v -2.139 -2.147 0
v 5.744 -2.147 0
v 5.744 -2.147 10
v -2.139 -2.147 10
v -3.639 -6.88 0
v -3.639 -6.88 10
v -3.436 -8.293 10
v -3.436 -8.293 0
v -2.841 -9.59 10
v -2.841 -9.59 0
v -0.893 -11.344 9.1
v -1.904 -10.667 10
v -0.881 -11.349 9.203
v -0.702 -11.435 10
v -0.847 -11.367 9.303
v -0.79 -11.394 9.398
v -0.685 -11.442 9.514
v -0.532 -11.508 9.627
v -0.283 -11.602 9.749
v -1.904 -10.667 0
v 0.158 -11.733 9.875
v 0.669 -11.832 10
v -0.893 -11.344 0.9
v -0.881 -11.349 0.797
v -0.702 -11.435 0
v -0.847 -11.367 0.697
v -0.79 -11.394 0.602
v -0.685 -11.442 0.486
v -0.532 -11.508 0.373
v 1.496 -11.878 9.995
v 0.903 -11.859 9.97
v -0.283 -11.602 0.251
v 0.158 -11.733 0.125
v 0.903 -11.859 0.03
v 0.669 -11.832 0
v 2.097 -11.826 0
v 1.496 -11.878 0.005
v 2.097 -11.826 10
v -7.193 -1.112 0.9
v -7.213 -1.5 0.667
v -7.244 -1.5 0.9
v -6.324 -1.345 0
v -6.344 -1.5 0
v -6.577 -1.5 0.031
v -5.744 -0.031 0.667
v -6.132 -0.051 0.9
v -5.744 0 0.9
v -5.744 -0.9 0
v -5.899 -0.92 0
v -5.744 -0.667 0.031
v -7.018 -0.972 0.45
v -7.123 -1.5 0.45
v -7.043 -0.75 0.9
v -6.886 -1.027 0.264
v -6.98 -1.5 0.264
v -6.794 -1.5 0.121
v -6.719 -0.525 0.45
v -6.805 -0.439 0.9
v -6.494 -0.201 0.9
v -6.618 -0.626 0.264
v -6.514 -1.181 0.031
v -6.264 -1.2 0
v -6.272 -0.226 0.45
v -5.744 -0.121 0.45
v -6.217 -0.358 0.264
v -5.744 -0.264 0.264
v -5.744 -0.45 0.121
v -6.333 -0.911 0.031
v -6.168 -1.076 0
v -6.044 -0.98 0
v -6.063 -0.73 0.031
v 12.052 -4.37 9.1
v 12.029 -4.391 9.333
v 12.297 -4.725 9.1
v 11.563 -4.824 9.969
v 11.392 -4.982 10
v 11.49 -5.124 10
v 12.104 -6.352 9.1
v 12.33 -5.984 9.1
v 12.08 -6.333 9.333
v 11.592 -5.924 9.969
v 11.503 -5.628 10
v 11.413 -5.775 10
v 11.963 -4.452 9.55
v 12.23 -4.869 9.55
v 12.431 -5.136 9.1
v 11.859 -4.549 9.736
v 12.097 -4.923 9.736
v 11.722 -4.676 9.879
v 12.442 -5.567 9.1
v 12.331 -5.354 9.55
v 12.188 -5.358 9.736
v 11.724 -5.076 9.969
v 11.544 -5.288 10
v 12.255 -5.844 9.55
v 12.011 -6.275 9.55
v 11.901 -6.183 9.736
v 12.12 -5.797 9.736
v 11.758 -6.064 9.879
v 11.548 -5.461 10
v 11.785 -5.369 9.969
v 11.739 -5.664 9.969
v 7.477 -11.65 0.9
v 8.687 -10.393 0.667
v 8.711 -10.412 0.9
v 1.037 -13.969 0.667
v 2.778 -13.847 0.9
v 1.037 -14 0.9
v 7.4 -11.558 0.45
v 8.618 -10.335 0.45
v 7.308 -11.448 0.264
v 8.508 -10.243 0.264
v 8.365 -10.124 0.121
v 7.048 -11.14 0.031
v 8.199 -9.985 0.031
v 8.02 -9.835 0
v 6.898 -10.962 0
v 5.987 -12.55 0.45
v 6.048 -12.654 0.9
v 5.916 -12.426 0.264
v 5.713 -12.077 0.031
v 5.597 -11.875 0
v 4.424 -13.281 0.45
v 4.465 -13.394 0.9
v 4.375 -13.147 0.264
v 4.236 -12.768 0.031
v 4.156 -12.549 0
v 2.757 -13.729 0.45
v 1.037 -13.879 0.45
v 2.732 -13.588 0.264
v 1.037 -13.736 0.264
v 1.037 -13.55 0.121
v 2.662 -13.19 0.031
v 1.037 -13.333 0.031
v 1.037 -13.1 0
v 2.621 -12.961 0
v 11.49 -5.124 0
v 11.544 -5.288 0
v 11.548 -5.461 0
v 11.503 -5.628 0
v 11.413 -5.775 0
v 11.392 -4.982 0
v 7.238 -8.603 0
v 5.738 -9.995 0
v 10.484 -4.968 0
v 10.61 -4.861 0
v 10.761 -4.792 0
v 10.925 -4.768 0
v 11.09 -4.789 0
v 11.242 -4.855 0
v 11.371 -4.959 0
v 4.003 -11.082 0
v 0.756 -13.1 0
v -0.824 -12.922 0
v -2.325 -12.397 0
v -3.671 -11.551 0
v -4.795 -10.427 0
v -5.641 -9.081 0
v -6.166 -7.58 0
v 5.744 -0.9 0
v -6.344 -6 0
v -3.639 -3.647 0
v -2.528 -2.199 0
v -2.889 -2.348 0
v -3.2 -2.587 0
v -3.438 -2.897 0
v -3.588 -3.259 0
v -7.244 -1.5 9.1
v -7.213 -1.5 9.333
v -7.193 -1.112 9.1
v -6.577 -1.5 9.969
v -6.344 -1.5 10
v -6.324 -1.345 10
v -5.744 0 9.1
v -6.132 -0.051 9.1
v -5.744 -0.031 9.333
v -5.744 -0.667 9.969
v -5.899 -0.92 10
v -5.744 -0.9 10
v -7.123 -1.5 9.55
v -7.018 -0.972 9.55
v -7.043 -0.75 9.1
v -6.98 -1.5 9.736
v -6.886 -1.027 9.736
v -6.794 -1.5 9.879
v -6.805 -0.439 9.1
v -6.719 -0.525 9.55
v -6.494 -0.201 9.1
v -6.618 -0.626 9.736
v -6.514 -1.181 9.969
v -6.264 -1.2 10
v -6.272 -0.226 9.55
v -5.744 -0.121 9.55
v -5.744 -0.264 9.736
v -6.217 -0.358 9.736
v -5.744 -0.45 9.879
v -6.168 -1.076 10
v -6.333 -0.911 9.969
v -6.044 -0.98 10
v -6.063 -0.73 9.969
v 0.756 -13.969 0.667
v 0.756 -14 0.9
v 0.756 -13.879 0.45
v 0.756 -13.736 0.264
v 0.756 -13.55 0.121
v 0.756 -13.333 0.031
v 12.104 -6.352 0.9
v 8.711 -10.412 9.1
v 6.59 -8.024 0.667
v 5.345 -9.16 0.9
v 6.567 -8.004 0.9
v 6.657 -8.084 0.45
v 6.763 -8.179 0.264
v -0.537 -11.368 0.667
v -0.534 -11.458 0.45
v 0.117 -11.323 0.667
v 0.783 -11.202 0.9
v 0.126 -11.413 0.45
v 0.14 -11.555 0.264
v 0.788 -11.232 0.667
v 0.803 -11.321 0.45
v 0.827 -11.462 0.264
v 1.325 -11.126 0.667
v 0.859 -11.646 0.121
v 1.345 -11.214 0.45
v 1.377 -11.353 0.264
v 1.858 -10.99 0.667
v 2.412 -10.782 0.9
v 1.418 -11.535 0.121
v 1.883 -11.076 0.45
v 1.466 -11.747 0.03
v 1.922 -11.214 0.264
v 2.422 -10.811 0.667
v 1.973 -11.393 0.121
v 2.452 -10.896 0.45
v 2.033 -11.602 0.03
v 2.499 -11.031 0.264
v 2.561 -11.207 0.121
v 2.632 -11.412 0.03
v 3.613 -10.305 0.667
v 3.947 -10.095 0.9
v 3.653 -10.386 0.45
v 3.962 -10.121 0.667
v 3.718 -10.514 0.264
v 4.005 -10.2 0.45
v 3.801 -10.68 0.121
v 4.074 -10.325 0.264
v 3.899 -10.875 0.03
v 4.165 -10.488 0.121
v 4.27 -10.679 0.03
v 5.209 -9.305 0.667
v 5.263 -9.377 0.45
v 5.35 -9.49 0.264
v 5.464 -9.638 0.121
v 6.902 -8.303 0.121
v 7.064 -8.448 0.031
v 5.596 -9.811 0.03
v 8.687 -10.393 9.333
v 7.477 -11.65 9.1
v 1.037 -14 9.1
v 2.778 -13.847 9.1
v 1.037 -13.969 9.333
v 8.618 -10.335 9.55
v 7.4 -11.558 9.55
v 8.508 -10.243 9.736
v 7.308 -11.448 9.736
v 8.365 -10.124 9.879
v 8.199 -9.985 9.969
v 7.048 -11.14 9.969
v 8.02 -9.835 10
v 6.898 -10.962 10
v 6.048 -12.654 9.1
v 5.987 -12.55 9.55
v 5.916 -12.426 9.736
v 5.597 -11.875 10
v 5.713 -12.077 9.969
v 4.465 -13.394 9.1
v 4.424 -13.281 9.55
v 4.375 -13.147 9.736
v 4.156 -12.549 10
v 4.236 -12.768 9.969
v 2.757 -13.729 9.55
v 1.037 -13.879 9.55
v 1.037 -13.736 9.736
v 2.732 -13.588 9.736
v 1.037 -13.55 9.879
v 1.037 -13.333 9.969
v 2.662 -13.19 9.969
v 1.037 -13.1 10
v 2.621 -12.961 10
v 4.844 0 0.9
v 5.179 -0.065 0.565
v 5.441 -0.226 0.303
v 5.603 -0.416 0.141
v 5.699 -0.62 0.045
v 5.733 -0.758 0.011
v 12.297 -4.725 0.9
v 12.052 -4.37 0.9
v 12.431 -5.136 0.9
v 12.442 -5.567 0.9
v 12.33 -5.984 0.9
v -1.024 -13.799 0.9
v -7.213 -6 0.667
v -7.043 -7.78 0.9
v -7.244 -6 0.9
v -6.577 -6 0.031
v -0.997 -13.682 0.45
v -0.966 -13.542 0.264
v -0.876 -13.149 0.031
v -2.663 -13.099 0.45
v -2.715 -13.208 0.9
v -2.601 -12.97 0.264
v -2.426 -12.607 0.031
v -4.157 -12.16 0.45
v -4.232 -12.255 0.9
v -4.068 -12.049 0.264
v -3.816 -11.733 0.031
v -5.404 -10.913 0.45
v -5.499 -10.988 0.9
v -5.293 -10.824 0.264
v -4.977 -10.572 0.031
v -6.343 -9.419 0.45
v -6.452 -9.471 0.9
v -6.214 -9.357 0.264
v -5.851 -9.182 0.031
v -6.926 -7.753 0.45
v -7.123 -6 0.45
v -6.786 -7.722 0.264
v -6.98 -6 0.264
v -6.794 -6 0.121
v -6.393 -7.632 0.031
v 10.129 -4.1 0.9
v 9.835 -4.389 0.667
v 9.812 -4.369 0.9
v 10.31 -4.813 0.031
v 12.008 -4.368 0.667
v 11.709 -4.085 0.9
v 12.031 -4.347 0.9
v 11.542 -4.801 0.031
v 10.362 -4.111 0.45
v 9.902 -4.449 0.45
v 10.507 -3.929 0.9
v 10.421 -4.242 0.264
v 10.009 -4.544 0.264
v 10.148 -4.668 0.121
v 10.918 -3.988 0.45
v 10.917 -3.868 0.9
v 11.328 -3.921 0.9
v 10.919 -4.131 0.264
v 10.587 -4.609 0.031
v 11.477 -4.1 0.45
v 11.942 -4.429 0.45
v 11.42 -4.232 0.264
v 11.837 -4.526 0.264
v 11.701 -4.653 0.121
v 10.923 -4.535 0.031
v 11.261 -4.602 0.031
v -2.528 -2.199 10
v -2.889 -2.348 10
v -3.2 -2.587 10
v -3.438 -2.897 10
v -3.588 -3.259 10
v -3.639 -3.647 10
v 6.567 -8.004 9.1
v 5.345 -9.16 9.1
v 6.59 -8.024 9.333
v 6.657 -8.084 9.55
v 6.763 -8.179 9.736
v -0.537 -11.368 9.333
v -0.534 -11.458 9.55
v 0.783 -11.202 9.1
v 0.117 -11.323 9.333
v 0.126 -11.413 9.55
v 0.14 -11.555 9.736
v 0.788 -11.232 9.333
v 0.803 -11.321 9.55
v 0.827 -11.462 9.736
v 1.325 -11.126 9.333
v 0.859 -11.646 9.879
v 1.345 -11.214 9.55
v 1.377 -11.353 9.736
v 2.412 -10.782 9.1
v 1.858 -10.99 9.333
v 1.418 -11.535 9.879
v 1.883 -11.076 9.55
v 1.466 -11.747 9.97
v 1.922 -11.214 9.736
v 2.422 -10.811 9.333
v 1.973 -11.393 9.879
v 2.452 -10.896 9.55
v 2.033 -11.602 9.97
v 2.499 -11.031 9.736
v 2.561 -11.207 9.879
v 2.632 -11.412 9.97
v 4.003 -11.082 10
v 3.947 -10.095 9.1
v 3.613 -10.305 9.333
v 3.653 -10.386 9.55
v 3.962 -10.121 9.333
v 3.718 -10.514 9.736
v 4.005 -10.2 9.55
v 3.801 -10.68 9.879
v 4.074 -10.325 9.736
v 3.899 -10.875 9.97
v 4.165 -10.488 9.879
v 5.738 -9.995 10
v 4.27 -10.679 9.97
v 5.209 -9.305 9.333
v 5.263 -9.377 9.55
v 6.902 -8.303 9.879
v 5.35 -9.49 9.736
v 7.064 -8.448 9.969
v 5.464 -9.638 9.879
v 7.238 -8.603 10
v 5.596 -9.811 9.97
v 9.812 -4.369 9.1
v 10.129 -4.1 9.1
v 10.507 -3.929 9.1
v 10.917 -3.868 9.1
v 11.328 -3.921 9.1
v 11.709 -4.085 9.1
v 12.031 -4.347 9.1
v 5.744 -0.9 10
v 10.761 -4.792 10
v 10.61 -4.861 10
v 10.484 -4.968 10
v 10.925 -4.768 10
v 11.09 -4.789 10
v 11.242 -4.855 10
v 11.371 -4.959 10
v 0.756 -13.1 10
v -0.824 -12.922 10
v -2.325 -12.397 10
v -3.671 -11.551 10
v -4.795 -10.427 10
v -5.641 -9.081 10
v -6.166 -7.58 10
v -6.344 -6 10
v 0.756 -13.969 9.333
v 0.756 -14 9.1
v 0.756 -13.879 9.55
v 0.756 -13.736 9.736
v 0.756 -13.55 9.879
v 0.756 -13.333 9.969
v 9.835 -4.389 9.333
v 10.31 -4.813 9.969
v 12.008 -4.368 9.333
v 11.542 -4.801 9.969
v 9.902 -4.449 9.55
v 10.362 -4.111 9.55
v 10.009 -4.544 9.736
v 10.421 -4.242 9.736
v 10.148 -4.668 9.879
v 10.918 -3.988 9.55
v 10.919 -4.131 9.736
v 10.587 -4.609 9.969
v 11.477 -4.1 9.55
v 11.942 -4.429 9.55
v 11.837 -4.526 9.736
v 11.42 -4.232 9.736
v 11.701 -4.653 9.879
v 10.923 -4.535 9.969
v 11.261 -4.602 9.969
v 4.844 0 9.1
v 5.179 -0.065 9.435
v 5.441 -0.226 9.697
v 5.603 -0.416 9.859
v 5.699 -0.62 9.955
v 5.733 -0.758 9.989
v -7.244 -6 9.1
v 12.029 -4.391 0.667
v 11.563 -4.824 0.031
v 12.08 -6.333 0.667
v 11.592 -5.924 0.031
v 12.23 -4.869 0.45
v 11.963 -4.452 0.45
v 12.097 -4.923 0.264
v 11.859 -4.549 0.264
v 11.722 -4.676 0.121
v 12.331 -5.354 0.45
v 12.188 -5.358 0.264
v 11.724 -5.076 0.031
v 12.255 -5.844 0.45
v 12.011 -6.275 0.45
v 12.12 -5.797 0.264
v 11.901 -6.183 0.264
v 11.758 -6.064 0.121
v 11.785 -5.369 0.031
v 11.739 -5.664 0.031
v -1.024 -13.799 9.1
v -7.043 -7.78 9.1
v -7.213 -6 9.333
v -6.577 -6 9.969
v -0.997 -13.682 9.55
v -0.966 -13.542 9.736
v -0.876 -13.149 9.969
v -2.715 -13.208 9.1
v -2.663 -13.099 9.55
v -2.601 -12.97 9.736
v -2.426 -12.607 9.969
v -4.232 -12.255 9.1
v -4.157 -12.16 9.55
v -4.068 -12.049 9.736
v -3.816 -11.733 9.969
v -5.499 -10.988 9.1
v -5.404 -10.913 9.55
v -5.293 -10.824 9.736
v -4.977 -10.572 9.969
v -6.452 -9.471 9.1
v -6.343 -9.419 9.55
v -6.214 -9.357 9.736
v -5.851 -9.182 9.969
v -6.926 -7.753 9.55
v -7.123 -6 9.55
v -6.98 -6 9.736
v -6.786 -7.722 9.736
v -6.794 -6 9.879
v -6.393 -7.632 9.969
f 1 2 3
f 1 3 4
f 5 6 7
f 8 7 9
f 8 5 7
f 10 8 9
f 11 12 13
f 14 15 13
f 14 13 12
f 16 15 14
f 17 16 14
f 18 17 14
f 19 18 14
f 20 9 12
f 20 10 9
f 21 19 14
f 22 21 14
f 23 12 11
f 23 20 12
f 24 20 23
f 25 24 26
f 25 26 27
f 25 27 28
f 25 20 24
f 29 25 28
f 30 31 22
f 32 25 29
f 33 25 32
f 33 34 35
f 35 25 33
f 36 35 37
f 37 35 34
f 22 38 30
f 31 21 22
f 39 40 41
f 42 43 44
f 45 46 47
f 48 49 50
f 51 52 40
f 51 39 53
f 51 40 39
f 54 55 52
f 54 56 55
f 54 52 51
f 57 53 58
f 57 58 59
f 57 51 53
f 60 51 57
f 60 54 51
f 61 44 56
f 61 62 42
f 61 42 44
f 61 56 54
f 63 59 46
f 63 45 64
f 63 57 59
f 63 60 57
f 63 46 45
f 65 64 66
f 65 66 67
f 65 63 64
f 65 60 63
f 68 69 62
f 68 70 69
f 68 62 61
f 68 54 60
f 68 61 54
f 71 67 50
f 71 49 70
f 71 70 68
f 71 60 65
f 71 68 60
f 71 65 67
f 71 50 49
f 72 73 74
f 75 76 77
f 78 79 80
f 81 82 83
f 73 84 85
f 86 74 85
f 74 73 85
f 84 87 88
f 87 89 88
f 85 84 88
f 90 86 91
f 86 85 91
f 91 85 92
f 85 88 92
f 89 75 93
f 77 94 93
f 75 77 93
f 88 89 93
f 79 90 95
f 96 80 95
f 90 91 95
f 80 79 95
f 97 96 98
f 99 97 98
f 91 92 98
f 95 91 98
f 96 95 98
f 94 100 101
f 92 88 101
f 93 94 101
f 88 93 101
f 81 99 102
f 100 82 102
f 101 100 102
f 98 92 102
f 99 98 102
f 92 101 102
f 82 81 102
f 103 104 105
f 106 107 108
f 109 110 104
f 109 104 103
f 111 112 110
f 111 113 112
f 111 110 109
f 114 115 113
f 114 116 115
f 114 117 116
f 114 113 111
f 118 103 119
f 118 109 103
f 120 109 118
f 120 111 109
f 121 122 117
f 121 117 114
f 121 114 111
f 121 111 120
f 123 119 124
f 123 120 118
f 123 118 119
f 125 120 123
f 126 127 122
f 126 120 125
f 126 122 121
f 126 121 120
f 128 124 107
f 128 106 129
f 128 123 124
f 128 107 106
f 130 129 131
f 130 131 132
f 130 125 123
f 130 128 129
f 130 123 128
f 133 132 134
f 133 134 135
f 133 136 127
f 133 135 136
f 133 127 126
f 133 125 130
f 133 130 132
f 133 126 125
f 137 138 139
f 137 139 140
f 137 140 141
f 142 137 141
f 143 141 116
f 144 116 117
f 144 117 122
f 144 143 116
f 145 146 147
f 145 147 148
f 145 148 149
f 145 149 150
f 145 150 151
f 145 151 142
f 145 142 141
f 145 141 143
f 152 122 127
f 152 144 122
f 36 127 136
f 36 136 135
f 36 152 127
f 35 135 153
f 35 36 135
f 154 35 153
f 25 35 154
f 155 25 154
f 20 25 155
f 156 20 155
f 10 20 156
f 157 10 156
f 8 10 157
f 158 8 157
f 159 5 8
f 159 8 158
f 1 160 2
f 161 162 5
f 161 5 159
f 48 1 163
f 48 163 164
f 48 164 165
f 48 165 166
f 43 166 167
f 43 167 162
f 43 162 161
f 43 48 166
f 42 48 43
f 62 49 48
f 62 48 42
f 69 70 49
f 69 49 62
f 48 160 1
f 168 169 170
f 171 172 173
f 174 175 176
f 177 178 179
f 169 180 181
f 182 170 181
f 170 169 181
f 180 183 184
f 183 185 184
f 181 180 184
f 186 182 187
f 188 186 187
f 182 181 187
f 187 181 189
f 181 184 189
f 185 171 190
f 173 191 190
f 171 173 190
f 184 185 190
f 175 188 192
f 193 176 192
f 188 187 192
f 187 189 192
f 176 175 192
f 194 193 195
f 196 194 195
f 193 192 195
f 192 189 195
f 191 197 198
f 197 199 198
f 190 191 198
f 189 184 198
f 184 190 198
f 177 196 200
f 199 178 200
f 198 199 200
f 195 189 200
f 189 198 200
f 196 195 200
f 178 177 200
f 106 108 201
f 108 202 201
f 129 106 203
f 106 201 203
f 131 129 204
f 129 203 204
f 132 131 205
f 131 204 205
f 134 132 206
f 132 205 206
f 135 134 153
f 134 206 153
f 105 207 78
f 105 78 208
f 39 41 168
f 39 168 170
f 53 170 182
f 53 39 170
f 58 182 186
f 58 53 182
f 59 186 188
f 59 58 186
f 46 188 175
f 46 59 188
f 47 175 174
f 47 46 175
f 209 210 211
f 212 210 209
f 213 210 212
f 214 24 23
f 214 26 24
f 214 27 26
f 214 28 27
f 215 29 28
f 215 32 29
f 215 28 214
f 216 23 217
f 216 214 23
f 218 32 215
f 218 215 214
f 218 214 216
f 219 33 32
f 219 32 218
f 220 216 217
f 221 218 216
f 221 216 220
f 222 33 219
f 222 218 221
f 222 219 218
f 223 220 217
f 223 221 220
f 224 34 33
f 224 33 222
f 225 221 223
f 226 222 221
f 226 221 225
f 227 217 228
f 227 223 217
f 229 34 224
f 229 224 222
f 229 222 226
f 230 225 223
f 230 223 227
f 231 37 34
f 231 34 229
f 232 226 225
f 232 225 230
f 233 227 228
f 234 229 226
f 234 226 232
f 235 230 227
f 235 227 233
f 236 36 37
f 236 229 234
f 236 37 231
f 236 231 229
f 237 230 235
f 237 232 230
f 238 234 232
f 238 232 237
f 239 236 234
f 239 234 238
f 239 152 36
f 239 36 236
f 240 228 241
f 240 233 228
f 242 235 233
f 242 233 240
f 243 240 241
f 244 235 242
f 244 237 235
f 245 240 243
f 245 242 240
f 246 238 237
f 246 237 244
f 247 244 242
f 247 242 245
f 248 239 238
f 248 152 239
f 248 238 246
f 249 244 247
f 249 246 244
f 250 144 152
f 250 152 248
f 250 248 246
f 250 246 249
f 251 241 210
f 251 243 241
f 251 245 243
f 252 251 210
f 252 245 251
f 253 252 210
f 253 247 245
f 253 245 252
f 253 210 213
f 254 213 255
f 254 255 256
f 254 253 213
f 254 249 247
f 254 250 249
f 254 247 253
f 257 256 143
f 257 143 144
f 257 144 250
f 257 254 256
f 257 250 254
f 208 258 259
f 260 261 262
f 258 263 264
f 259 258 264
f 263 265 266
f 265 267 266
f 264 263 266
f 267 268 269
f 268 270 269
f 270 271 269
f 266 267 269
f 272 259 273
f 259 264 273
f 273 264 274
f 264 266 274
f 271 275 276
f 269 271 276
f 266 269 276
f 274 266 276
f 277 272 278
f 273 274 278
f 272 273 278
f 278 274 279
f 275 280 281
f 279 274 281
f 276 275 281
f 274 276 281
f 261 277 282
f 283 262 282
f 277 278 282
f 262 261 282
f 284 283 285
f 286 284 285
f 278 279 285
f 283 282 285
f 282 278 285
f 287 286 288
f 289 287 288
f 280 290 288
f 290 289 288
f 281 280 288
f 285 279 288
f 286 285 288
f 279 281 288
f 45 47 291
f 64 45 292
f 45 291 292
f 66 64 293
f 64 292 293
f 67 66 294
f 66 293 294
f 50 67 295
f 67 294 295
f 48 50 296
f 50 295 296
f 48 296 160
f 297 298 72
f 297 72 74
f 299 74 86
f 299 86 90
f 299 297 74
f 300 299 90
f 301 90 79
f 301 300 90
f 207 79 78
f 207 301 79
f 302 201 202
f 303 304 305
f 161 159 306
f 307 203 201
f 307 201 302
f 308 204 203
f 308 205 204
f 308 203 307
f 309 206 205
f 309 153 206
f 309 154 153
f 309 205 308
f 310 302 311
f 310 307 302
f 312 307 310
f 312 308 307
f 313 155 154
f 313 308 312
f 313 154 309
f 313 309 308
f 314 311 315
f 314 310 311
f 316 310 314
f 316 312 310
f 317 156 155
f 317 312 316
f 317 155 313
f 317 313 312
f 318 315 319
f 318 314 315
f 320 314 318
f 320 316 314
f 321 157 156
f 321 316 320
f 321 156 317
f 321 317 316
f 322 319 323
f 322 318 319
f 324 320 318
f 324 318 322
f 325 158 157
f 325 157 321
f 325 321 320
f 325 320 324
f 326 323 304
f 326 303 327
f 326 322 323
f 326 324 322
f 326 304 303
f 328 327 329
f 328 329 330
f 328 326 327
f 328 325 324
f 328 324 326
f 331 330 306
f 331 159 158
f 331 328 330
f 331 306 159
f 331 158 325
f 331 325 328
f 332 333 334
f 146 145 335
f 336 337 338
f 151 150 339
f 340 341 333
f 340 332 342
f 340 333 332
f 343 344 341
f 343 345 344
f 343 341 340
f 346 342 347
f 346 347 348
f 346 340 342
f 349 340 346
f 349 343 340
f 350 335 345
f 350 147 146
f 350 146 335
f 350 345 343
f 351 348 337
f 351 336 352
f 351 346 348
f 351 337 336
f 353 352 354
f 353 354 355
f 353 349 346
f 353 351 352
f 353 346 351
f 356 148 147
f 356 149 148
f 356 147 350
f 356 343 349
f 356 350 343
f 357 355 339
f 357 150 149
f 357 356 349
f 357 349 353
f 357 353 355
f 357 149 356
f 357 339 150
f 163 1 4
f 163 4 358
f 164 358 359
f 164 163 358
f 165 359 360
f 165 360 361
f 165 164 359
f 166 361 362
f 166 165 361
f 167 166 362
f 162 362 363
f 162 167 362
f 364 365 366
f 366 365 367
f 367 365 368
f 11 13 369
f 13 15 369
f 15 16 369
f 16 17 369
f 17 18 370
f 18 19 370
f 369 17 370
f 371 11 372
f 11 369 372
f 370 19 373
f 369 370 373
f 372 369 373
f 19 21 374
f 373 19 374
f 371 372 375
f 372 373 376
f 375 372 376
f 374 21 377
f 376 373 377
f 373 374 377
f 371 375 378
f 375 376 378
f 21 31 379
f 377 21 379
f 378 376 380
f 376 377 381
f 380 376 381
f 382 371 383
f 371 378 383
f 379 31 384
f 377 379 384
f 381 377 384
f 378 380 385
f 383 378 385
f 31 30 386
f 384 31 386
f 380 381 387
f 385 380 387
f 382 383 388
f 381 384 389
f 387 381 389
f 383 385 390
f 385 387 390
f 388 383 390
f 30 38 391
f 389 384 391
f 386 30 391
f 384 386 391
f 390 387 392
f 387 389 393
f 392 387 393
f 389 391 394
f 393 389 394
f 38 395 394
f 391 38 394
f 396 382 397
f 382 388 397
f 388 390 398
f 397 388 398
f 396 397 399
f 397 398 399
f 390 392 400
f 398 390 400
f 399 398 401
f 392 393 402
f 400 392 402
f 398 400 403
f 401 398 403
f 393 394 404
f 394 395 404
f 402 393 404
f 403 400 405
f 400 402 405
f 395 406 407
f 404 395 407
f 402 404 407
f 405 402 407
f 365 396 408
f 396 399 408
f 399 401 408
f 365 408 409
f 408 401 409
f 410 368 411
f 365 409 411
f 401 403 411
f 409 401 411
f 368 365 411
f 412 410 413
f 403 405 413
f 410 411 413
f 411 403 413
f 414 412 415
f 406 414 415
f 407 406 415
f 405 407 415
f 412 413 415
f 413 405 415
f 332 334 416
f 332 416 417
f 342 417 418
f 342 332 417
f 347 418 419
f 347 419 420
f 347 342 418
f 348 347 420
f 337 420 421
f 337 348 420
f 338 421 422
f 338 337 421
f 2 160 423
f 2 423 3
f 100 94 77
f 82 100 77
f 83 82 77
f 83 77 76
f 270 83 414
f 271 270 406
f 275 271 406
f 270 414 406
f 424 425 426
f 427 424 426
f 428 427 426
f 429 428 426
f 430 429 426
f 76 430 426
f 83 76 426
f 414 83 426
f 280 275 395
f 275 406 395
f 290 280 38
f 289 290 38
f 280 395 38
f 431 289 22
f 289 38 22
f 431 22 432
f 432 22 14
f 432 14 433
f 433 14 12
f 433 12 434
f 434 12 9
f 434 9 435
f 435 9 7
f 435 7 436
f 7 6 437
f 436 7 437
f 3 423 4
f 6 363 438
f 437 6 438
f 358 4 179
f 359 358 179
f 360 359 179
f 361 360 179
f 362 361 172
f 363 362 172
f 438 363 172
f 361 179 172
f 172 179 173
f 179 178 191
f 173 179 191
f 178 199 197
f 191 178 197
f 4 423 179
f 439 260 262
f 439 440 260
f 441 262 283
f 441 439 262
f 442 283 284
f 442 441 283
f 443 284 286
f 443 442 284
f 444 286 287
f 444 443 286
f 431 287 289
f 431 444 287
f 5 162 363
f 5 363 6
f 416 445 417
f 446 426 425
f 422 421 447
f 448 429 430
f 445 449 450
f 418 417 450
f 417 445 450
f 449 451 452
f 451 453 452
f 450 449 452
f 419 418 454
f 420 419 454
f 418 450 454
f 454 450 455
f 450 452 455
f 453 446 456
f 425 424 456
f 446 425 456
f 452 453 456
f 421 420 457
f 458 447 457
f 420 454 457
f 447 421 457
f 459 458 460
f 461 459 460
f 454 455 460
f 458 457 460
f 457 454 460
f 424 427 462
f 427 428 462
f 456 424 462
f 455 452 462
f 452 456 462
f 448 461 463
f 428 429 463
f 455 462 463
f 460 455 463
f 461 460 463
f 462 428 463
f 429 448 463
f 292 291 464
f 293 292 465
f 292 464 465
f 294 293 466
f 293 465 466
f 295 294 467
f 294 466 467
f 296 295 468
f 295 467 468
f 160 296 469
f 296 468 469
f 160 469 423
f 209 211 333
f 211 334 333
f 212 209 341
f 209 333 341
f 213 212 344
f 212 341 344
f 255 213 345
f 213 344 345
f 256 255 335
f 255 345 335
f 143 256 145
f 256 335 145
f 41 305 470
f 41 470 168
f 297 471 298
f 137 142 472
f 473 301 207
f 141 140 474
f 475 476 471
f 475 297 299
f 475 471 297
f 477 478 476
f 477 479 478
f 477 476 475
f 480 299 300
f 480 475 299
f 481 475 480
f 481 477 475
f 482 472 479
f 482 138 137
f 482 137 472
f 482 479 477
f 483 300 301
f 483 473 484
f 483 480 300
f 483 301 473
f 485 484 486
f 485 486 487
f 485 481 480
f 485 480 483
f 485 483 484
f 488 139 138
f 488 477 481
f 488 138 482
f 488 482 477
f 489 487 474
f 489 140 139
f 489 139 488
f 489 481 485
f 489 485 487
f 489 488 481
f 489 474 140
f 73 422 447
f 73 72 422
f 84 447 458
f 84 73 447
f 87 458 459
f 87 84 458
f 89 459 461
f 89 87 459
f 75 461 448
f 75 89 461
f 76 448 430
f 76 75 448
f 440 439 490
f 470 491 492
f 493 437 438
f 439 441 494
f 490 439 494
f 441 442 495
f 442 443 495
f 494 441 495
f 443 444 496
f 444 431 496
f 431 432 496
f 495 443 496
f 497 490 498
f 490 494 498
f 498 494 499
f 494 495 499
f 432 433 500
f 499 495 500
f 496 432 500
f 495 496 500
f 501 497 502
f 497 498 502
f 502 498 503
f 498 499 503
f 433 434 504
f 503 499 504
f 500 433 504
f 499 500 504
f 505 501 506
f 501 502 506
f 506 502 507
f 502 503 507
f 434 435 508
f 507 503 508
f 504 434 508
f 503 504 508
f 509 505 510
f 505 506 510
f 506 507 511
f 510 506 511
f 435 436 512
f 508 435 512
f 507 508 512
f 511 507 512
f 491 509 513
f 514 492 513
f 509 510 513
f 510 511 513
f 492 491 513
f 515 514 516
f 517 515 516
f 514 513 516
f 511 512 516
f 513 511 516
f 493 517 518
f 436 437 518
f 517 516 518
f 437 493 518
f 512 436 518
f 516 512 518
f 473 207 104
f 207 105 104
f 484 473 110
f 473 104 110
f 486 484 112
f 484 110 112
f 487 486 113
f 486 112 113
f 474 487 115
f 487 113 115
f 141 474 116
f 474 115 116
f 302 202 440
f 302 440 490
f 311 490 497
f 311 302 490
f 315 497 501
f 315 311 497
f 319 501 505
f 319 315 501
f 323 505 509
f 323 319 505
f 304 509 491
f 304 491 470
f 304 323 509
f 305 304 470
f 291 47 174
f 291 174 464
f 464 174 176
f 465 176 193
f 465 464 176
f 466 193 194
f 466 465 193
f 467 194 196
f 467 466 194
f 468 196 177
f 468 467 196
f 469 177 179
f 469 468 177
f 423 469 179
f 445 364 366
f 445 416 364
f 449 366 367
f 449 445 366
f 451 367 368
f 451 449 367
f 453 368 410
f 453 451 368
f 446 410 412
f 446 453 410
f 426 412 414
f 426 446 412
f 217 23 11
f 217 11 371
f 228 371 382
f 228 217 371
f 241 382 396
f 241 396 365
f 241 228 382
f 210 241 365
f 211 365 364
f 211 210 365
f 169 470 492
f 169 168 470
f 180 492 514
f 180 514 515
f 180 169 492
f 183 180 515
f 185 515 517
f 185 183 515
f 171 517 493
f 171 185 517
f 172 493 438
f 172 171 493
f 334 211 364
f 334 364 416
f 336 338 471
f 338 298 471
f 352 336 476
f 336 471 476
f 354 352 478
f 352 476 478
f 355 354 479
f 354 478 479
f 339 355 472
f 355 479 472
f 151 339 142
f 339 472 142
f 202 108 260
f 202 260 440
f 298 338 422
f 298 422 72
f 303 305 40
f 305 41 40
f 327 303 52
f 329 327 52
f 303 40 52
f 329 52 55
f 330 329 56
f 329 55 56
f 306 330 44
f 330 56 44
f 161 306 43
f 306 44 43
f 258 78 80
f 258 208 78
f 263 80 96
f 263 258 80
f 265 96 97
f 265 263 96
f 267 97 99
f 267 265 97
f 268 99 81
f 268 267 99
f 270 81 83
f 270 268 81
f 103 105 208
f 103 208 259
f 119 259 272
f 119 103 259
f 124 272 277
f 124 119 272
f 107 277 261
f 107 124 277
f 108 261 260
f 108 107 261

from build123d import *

# Parameters (mm, degrees)
SALIENTE_EXTRUIR1_DEPTH = 10
REDONDEO8_R             = 0.9


with BuildPart() as part:
    # Croquis2 → Saliente-Extruir1 (new body)
    with BuildSketch(Plane.XY):
        with BuildLine():
            Line((-5.744063225, 0), (5.744063225, 0))
            Line((5.744063225, 0), (5.744063225, -2.147495728))
            Line((5.744063225, -2.147495728), (-2.139285526, -2.147495728))
            ThreePointArc((-2.139285526, -2.147495728), (-3.199945698, -2.586835556), (-3.639285526, -3.647495728))
            Line((-3.639285526, -3.647495728), (-3.639285526, -6.880160463))
            ThreePointArc((-3.639285526, -6.880160463), (-2.897621881, -9.500574837), (-0.892656931, -11.34360278))
            ThreePointArc((-0.892656931, -11.34360278), (3.193809946, -10.470529341), (6.566719686, -8.003760473))
            Line((6.566719686, -8.003760473), (9.81244552, -4.368547538))
            ThreePointArc((9.81244552, -4.368547538), (10.916709754, -3.867642659), (12.03054225, -4.346894543))
            Line((12.03054225, -4.346894543), (12.051695209, -4.369674653))
            ThreePointArc((12.051695209, -4.369674653), (12.451992737, -5.351153846), (12.103519704, -6.352206325))
            Line((12.103519704, -6.352206325), (8.710612857, -10.412366821))
            ThreePointArc((8.710612857, -10.412366821), (5.272528505, -13.058798712), (1.037181306, -14))
            Line((1.037181306, -14), (0.755936775, -14))
            ThreePointArc((0.755936775, -14), (-4.900917475, -11.656854249), (-7.244063225, -6))
            Line((-7.244063225, -6), (-7.244063225, -1.5))
            ThreePointArc((-7.244063225, -1.5), (-6.804723397, -0.439339828), (-5.744063225, 0))
        make_face()
    extrude(amount=SALIENTE_EXTRUIR1_DEPTH)

    # Redondeo8
    redondeo8_edges = [part.edges().sort_by_distance(p)[0] for p in [
        (-6.804723397, -0.439339828, 10),
        (-7.244063225, -3.75, 10),
        (3.193809946, -10.470529341, 0),
        (8.189582603, -6.186154005, 0),
        (10.916709754, -3.867642659, 0),
        (12.041118729, -4.358284598, 0),
        (12.451992737, -5.351153846, 0),
        (10.40706628, -8.382286573, 0),
        (5.272528505, -13.058798712, 0),
        (-4.900917475, -11.656854249, 10),
        (0.89655904, -14, 0),
        (-4.900917475, -11.656854249, 0),
        (-7.244063225, -3.75, 0),
        (-6.804723397, -0.439339828, 0),
        (0, 0, 0),
        (0.89655904, -14, 10),
        (5.272528505, -13.058798712, 10),
        (5.744063225, 0, 5),
        (10.40706628, -8.382286573, 10),
        (12.451992737, -5.351153846, 10),
        (12.041118729, -4.358284598, 10),
        (10.916709754, -3.867642659, 10),
        (8.189582603, -6.186154005, 10),
        (3.193809946, -10.470529341, 10),
        (0, 0, 10),
    ]]
    fillet(redondeo8_edges, radius=REDONDEO8_R)


solid = part.part
